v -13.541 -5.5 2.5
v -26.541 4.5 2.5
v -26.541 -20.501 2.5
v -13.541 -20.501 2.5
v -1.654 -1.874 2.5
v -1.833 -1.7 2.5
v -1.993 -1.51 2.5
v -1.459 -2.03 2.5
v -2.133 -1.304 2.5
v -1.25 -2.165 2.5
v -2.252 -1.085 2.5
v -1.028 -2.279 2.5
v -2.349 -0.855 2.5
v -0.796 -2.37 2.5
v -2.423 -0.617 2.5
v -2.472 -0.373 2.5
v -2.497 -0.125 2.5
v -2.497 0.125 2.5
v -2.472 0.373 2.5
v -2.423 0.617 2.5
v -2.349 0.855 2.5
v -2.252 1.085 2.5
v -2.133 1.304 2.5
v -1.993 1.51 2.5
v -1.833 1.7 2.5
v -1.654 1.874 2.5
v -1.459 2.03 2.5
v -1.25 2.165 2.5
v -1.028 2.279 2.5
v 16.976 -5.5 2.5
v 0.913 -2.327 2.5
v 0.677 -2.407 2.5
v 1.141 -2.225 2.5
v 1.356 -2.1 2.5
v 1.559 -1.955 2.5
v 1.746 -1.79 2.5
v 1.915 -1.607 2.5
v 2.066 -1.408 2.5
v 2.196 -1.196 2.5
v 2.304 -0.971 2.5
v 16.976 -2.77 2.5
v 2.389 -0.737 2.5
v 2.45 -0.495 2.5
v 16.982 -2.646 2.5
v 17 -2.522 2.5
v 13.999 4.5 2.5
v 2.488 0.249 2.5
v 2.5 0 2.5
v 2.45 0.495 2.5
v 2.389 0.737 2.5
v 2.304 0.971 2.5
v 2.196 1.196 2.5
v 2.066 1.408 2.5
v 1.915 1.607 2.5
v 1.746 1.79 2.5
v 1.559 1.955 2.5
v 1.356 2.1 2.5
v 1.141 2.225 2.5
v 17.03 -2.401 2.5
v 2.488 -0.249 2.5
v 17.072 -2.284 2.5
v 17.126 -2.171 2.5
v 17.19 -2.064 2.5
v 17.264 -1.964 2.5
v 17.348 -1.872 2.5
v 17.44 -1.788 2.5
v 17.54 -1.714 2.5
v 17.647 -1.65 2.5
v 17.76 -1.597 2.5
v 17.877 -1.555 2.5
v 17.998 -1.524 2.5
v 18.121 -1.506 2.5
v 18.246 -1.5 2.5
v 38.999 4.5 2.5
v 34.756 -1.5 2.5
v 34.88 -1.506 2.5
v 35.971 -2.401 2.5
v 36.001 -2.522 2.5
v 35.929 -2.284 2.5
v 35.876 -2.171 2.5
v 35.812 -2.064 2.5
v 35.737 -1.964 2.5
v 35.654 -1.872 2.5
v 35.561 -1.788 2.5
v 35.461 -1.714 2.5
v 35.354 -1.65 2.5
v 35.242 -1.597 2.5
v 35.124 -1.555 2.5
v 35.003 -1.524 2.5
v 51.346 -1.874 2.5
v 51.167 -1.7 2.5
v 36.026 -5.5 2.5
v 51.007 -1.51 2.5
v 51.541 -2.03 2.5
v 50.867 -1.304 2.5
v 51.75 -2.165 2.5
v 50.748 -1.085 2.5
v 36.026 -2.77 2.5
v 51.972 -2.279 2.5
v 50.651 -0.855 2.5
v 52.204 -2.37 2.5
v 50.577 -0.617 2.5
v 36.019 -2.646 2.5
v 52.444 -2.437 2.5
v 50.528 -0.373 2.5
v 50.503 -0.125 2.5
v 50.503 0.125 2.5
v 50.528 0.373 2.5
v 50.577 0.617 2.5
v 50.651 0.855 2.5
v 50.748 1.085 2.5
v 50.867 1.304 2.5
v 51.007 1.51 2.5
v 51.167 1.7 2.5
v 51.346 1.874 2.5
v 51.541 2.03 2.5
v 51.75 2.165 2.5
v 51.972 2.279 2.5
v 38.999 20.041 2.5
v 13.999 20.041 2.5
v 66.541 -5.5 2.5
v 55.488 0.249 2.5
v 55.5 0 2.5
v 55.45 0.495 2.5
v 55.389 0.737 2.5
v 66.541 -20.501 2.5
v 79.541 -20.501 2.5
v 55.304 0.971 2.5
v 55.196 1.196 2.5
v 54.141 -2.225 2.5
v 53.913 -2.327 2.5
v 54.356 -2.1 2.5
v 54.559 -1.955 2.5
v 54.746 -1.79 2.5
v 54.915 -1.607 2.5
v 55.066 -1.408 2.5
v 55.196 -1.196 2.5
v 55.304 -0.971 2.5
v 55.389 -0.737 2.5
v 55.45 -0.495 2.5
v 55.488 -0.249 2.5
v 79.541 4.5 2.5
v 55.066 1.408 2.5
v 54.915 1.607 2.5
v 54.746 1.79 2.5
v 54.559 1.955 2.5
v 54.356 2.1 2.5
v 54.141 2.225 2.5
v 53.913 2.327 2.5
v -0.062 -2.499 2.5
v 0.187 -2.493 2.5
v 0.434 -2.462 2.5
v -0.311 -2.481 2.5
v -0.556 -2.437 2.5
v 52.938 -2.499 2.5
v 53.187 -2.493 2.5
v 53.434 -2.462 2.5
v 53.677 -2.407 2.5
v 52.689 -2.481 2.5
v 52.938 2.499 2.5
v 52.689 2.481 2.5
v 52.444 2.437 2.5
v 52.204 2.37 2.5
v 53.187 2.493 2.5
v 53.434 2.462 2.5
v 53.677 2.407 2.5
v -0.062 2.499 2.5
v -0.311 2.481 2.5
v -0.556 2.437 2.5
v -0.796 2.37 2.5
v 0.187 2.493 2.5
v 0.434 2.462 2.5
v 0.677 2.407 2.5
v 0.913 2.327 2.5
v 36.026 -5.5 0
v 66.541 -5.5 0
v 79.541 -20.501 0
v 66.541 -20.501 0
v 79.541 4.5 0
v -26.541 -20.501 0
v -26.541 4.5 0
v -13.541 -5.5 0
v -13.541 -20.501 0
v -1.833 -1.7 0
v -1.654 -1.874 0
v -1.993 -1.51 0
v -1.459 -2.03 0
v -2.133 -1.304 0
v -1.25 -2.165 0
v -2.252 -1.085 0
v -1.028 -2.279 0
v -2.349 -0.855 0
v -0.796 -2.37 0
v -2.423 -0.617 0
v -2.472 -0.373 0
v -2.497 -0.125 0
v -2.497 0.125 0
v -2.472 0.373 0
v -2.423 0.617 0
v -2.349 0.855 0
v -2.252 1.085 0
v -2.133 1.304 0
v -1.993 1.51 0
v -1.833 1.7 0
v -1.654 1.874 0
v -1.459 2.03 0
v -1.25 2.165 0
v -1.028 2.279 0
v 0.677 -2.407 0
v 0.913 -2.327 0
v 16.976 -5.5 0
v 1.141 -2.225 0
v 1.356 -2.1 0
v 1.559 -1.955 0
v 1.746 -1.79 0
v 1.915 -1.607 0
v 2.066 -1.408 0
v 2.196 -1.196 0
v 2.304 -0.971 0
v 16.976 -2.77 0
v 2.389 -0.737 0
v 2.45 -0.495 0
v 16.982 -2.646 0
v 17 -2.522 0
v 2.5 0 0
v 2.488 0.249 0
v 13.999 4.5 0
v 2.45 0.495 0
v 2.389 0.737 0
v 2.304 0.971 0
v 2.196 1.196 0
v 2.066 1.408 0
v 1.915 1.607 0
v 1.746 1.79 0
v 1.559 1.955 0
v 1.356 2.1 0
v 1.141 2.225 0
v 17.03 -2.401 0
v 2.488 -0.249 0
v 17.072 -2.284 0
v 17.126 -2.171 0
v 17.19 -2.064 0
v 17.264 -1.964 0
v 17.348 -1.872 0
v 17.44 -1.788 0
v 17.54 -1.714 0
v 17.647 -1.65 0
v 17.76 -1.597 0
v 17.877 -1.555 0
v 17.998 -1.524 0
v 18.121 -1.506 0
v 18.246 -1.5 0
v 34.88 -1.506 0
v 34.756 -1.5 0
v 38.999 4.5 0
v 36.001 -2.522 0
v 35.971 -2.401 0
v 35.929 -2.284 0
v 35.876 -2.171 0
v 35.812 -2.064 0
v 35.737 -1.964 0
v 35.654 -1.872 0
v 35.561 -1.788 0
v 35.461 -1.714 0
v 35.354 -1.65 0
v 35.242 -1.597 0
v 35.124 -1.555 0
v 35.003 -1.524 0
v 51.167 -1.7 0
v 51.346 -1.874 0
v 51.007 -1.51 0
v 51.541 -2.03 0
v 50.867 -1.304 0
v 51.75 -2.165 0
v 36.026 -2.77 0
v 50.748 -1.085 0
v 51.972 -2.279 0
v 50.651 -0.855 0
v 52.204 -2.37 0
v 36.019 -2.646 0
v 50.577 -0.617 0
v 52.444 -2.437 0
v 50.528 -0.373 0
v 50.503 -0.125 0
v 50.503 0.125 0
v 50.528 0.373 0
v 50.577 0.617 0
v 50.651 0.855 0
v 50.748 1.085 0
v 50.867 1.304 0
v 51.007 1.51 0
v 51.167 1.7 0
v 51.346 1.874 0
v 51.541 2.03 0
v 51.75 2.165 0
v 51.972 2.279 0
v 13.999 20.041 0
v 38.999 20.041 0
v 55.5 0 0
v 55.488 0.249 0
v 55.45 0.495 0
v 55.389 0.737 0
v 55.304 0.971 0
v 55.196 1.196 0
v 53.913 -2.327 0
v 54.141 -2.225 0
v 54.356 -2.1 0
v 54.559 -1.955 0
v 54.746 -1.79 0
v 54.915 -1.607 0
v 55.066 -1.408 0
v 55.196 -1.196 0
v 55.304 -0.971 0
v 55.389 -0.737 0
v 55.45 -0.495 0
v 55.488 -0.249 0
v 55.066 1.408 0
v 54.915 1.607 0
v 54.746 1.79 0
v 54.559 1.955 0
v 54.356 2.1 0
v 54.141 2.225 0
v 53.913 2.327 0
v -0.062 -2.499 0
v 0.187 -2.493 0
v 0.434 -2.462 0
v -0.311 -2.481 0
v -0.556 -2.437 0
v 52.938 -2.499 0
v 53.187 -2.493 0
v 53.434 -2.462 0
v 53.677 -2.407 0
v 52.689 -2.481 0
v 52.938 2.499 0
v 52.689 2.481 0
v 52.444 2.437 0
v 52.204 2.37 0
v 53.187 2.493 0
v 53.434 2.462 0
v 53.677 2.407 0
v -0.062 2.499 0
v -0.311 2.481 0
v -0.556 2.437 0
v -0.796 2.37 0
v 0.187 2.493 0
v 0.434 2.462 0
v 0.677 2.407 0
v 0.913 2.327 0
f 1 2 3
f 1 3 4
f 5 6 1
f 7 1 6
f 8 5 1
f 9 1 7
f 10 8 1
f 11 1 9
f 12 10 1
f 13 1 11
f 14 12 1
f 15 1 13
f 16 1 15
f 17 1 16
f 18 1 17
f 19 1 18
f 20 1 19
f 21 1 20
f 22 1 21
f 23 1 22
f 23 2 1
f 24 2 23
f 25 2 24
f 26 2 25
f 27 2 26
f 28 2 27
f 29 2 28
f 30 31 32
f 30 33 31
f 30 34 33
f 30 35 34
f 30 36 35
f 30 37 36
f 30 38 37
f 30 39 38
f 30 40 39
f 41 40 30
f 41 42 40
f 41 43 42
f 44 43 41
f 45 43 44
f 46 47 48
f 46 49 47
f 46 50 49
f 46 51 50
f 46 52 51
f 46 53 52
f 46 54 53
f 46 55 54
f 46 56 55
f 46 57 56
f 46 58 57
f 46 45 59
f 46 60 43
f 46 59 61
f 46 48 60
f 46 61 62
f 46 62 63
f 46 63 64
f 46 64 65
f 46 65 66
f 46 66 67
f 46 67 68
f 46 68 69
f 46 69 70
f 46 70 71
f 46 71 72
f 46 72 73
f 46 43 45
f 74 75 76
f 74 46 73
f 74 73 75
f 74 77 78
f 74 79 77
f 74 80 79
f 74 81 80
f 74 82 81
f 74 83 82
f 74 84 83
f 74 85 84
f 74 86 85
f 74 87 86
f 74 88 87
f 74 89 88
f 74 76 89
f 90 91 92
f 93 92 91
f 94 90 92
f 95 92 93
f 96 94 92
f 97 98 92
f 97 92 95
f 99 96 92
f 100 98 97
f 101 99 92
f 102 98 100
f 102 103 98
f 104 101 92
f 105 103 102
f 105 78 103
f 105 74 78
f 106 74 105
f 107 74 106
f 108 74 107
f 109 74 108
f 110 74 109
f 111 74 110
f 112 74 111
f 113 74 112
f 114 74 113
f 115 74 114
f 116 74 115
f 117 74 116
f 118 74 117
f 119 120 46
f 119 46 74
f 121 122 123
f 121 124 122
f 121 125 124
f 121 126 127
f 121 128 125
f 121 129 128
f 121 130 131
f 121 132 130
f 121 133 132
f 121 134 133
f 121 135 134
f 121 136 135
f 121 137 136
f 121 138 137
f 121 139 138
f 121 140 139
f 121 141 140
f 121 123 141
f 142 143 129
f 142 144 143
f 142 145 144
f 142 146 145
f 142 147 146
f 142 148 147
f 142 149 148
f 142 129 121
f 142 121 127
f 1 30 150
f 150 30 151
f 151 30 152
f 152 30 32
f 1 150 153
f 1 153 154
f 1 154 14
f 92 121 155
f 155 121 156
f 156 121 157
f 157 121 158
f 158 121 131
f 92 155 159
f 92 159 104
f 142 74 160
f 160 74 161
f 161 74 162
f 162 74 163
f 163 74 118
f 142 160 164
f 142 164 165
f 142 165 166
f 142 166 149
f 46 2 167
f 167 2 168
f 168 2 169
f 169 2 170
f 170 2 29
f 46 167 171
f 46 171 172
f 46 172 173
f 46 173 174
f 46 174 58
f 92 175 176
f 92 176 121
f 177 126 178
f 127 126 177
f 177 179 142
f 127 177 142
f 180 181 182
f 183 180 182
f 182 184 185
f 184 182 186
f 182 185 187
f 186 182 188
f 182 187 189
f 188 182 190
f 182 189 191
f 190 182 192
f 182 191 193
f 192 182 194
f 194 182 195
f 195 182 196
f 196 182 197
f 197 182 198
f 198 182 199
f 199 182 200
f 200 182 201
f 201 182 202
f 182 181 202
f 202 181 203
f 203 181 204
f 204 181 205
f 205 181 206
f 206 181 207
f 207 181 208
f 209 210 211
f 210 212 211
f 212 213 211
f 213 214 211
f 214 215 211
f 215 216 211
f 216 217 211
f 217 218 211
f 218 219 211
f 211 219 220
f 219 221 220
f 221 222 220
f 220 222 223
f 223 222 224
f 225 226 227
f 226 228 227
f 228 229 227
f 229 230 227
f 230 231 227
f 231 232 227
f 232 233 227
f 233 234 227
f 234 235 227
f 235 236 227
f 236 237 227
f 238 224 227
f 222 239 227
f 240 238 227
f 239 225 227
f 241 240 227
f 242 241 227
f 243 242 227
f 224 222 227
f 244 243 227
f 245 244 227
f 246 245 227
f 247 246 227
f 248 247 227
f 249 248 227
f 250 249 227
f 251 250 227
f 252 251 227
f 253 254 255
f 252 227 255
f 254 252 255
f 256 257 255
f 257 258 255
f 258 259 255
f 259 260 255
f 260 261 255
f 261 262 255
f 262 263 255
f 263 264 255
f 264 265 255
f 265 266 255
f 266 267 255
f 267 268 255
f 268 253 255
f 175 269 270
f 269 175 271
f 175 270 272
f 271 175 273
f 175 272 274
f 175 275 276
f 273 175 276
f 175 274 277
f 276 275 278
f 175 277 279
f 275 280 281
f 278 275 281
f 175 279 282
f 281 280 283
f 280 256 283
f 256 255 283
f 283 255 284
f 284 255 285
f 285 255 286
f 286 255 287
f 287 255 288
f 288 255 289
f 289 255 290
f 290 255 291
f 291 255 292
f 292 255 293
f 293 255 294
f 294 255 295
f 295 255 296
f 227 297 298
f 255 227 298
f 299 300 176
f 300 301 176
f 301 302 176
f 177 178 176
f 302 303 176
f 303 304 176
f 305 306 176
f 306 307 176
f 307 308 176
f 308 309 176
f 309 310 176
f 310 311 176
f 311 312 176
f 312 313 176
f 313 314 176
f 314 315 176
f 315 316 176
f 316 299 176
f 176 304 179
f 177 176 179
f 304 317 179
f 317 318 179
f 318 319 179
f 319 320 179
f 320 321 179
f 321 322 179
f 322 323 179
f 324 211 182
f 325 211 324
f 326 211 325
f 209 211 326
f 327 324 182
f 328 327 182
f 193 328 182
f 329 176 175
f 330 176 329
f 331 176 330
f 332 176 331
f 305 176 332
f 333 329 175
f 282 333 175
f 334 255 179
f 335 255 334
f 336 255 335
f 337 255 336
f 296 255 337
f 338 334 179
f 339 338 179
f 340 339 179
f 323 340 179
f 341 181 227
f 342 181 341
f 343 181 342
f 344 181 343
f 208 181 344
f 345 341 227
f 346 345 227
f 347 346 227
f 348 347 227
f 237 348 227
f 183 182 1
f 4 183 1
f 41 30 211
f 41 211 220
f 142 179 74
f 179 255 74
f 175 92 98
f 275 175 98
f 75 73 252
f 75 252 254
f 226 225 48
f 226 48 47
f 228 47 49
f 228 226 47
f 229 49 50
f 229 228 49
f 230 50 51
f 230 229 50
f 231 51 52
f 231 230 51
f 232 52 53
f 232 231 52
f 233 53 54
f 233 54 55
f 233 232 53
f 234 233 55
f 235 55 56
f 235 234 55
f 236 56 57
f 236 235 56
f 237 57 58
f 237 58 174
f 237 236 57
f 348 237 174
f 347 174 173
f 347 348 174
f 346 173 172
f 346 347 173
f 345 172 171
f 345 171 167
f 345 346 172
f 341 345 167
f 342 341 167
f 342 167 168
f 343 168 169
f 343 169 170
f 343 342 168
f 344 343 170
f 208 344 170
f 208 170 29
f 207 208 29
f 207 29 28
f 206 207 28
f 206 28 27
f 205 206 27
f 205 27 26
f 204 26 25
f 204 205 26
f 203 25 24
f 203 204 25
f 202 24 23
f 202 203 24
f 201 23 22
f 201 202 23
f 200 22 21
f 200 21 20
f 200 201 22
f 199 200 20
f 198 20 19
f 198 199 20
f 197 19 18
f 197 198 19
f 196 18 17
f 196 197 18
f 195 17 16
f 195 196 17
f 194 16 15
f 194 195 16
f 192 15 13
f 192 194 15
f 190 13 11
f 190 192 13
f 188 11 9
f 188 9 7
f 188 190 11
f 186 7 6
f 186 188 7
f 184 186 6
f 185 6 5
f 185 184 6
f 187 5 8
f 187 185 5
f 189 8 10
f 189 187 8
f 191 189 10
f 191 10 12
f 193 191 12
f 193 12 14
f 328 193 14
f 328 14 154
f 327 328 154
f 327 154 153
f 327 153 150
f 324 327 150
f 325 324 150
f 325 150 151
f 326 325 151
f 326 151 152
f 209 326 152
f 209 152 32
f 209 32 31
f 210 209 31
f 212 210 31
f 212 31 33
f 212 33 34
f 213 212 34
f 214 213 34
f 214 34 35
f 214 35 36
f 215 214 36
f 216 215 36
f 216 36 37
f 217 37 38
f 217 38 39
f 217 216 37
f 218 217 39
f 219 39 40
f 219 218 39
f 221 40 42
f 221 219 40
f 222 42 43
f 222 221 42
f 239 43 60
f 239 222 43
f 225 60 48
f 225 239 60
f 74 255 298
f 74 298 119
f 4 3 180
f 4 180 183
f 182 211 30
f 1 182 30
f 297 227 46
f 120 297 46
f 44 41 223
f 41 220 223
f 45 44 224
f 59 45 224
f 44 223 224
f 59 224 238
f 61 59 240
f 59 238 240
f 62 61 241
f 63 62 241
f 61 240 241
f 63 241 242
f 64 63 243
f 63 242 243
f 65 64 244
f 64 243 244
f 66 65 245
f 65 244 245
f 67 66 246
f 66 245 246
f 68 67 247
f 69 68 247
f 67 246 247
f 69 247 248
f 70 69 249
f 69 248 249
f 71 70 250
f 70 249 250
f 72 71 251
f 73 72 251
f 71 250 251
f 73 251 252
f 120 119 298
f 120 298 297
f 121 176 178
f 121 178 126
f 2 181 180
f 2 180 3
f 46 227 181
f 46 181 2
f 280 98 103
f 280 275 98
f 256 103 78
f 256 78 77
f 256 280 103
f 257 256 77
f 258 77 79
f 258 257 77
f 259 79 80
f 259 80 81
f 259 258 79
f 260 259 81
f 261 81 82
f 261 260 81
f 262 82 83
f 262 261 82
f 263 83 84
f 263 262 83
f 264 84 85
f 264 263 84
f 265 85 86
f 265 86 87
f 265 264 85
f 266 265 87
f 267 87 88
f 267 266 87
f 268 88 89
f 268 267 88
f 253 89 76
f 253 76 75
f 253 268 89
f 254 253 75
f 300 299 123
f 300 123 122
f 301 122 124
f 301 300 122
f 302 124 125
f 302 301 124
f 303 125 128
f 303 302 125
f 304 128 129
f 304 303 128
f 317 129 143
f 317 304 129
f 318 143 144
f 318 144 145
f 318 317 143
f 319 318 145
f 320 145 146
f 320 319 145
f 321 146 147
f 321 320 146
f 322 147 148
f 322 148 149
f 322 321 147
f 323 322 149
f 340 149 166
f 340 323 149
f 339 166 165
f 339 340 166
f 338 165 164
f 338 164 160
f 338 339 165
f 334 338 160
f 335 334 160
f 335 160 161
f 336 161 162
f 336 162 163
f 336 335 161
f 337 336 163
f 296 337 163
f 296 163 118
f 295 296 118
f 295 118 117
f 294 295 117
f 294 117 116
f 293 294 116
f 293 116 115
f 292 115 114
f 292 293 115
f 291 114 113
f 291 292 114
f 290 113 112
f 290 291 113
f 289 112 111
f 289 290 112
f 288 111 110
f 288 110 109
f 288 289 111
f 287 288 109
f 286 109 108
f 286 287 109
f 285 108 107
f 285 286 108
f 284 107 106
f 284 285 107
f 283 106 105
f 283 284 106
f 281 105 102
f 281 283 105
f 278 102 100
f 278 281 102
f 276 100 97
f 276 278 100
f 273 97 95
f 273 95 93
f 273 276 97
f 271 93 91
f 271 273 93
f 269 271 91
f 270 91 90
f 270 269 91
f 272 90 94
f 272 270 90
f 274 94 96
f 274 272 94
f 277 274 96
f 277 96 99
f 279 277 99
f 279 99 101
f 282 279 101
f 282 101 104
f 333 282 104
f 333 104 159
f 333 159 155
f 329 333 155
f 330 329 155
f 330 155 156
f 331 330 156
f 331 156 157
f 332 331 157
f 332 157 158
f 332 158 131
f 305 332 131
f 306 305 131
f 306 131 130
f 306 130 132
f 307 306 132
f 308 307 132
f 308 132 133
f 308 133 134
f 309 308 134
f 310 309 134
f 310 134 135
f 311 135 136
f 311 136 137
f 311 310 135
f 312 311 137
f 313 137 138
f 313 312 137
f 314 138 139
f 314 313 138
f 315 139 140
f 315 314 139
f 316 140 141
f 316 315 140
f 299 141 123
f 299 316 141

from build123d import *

# Parameters (mm, degrees)
F0_W      = 61.9999956
F0_H      = 10
F0_R      = 2.5
F1_DEPTH  = 2.5
F2_W      = 19.05
F2_H      = 4
F3_DEPTH  = 25.4
F4_R      = 1.27
F5_W      = 25
F5_H      = 2.5
F6_DEPTH  = 15.5406199982
F7_DEPTH  = 22.0406214
F8_W      = 12.99972
F8_H      = 2.5
F9_DEPTH  = 35.0012
F11_DEPTH = 22.0406214
F12_W     = 12.99972
F12_H     = 2.5
F13_DEPTH = 35.0012
F15_W     = 106.0812384
F15_H     = 37.9534307867
F16_DEPTH = 2.501


with BuildPart() as f1:
    # F0 (on Top) → F1 (new body)
    with BuildSketch(Plane.XY):
        with Locations((26.4999978, -0.5)):
            Rectangle(F0_W, F0_H)
        Circle(F0_R, mode=Mode.SUBTRACT)
        with Locations((52.9999956, 0)):
            Circle(F0_R, mode=Mode.SUBTRACT)
    extrude(amount=F1_DEPTH)

    # F2 (on face) → F3 (cut)
    with BuildSketch(Plane.XY.offset(2.5)):
        with Locations((26.5005656, -3.5)):
            Rectangle(F2_W, F2_H)
    extrude(amount=-F3_DEPTH, mode=Mode.SUBTRACT)

    # F4
    f4_edges = [f1.edges().sort_by_distance(p)[0] for p in [
        (36.025566, -1.5, 1.25),
        (16.975566, -1.5, 1.25),
    ]]
    fillet(f4_edges, radius=F4_R)

    # F5 (on face) → F6 (join)
    with BuildSketch(Plane(origin=(0, 4.5, 0), x_dir=(-1, 0, 0), z_dir=(0, 1, 0))):
        with Locations((-26.49943, 1.25)):
            Rectangle(F5_W, F5_H)
    extrude(amount=F6_DEPTH)

    # F7 (add): a face of the model
    f7_faces = [f1.faces().sort_by_distance(p)[0] for p in [
        (57.4999956, -0.5, 1.25),
    ]]
    extrude(f7_faces, amount=F7_DEPTH)

    # F8 (on face) → F9 (join)
    with BuildSketch(Plane.XZ.offset(5.5)):
        with Locations((73.040757, 1.25)):
            Rectangle(F8_W, F8_H)
    extrude(amount=F9_DEPTH)

    # F11 (add): a face of the model
    f11_faces = [f1.faces().sort_by_distance(p)[0] for p in [
        (-4.5, -0.5, 1.25),
    ]]
    extrude(f11_faces, amount=F11_DEPTH)

    # F12 (on face) → F13 (join)
    with BuildSketch(Plane.XZ.offset(5.5)):
        with Locations((-20.0407614, 1.25)):
            Rectangle(F12_W, F12_H)
    extrude(amount=F13_DEPTH)

    # F15 (on face) → F16 (cut, through all)
    with BuildSketch(Plane.XY.offset(2.5)):
        with Locations((26.4999978, -39.4779353934)):
            Rectangle(F15_W, F15_H)
    extrude(amount=-F16_DEPTH, mode=Mode.SUBTRACT)


solid = f1.part
